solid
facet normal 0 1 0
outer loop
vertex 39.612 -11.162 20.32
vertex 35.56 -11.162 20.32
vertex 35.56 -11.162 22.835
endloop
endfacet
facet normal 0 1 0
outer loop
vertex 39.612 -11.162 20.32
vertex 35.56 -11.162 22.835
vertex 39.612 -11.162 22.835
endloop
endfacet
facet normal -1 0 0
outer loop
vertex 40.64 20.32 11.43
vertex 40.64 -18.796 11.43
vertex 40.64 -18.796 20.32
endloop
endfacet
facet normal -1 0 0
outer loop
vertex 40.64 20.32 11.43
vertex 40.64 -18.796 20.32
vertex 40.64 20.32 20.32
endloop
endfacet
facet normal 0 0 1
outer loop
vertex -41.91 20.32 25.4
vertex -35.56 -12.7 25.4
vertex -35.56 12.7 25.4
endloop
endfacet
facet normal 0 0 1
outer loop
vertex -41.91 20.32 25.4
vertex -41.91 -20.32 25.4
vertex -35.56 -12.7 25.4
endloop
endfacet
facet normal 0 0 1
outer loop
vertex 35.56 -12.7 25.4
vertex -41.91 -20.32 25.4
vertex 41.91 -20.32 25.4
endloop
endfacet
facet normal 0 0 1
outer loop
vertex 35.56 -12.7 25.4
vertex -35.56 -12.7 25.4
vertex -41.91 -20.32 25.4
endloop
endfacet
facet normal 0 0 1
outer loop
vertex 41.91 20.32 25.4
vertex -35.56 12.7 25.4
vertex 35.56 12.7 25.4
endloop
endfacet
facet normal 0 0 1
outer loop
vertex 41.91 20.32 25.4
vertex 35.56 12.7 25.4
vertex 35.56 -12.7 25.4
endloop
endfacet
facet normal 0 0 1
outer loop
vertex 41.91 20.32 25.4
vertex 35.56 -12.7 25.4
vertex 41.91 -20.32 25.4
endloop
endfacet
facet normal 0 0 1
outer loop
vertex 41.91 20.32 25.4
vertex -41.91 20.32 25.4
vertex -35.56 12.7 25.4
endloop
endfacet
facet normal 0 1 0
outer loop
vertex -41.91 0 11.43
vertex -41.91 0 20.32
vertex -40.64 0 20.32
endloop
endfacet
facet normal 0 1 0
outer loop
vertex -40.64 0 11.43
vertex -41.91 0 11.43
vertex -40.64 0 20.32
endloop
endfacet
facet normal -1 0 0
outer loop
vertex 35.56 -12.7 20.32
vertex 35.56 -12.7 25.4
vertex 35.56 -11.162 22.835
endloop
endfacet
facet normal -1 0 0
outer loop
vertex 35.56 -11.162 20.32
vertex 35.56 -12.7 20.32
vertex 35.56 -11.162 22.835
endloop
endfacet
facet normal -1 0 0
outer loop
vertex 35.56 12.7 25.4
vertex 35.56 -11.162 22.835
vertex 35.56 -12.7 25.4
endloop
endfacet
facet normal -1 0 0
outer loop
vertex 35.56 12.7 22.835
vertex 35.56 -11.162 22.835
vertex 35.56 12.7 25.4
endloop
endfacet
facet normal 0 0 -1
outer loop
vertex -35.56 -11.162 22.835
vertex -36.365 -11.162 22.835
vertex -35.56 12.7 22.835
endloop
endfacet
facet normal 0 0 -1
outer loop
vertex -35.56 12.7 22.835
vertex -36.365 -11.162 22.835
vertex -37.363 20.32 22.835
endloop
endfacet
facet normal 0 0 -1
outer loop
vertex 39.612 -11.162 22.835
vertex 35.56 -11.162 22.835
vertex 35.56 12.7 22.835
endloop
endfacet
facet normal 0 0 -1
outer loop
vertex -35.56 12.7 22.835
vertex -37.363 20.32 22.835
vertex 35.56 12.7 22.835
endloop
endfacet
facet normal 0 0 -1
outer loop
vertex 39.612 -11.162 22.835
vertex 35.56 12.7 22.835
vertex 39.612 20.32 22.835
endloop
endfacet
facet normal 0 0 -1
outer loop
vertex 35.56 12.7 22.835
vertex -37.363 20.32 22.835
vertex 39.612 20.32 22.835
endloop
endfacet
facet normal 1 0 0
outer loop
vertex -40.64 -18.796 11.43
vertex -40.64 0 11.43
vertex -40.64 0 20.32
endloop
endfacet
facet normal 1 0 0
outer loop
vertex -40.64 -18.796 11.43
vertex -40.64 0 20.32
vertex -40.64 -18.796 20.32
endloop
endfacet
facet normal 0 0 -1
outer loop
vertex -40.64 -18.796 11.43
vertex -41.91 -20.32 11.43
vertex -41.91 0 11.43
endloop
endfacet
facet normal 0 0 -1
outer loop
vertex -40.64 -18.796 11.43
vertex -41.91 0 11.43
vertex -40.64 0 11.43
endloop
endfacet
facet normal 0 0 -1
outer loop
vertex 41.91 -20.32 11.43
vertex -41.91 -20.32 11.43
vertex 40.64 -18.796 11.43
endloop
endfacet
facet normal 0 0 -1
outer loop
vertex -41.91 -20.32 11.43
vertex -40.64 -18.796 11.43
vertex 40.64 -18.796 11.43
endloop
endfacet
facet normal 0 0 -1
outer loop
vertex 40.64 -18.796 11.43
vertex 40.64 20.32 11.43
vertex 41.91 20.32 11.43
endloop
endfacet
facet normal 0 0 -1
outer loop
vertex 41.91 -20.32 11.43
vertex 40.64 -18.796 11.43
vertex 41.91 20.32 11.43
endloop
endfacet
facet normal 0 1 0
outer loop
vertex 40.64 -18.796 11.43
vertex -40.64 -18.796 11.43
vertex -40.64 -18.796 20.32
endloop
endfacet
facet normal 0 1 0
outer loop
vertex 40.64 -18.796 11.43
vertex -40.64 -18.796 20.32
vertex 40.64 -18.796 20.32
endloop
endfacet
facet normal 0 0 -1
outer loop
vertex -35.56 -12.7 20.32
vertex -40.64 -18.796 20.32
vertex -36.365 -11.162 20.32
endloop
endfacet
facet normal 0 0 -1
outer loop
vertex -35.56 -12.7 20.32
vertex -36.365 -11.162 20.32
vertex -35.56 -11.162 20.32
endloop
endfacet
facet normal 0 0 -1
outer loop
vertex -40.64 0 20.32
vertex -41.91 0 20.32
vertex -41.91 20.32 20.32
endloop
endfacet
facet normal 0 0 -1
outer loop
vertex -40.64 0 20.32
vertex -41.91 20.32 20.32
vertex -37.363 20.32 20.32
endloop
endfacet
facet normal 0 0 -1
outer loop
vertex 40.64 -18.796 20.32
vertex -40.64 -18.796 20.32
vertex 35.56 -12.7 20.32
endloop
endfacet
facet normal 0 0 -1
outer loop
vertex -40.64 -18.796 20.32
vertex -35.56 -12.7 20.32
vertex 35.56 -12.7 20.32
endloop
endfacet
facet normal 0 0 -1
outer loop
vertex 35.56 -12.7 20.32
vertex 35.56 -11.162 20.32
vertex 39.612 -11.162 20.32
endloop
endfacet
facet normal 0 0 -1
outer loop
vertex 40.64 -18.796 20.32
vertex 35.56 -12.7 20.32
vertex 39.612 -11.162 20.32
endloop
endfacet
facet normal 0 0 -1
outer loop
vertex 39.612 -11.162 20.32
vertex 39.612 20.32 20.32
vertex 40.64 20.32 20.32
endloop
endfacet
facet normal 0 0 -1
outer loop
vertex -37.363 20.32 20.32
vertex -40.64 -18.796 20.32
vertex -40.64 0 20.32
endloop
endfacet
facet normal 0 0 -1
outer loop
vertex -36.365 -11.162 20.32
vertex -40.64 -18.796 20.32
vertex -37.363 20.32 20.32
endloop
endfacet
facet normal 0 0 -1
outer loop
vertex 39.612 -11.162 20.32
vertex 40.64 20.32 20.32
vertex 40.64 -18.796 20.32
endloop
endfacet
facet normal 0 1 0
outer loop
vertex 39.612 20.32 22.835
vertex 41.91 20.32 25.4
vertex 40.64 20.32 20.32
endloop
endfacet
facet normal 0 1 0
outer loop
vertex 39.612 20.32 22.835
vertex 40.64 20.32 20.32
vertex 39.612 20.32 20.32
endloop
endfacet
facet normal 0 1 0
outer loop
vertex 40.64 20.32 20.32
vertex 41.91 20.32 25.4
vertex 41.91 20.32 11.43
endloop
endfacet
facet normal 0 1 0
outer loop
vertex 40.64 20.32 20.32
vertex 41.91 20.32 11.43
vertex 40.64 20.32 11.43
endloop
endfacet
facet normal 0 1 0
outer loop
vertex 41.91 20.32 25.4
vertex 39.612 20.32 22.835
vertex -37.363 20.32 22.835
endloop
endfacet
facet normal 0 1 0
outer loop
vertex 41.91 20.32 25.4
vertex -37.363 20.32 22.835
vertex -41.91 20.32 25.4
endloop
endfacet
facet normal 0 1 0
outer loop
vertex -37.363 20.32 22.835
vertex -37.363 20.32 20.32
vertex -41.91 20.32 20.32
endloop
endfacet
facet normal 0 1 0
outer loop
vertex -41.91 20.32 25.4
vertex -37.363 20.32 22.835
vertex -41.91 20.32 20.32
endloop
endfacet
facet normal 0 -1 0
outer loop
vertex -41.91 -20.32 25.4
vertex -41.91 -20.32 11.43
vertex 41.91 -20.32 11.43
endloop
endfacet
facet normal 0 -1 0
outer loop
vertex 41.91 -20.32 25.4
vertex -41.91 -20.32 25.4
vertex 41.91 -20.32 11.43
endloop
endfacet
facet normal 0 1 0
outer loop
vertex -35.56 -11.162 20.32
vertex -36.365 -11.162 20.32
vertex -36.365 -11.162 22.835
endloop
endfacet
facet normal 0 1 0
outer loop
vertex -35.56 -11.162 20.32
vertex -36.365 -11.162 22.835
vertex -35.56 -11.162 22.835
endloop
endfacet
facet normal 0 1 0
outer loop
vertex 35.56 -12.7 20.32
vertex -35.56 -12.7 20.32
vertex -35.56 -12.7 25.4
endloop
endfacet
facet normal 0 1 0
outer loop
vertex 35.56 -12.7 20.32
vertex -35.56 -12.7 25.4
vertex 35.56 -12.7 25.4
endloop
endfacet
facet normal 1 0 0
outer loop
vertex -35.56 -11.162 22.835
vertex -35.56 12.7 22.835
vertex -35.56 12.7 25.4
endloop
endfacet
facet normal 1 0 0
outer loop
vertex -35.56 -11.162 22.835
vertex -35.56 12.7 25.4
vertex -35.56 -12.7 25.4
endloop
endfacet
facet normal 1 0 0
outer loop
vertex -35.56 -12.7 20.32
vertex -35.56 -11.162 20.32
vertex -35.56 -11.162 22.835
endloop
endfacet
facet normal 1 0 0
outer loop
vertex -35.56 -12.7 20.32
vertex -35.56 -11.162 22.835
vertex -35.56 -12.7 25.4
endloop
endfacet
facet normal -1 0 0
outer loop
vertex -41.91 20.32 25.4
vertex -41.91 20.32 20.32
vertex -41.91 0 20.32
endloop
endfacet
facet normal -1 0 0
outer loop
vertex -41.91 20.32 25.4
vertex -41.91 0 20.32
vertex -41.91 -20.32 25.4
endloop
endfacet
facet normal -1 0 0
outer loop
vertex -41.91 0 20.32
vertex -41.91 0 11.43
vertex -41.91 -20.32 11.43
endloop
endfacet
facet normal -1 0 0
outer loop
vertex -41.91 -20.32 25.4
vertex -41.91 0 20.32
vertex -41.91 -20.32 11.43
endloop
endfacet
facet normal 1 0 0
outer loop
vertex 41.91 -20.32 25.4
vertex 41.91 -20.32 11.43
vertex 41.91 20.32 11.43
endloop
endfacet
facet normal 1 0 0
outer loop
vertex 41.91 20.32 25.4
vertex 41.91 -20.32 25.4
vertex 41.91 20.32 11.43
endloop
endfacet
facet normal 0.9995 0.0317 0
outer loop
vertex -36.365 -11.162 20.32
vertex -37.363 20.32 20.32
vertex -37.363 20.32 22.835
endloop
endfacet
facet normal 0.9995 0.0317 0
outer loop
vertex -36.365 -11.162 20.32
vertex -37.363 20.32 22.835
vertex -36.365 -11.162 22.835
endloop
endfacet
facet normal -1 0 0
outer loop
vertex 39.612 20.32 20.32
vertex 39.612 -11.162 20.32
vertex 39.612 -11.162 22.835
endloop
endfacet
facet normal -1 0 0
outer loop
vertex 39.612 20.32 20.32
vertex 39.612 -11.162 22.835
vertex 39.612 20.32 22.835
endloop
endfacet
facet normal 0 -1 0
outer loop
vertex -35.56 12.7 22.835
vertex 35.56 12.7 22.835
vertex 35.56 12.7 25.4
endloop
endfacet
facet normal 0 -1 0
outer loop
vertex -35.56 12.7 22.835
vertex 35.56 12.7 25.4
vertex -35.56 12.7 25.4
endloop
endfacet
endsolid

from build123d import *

# Parameters (mm, degrees)
F2_DEPTH  = 25.4
F3_DEPTH  = 25.4
F5_DEPTH  = 20.32
F7_DEPTH  = 22.8346
F8_W      = 44.694509
F8_H      = 15.718196
F9_DEPTH  = 17.6276
F11_DEPTH = 11.43


with BuildPart() as f2:
    # F1 (on Top) → F2 (new body)
    with BuildSketch(Plane.XY):
        Polygon((-41.91, 20.32), (-41.91, 0), (-41.91, -20.32), (41.91, -20.32), (41.91, 20.32), align=None)
    extrude(amount=F2_DEPTH)

    # F0 (on Top) → F3 (cut)
    with BuildSketch(Plane.XY):
        Polygon((-35.56, 12.7), (-35.56, 0), (-35.56, -12.7), (35.56, -12.7), (35.56, 12.7), align=None)
    extrude(amount=F3_DEPTH, mode=Mode.SUBTRACT)

    # F4 (on Top) → F5 (cut)
    with BuildSketch(Plane.XY):
        Polygon((-44.768266, 0), (-40.64, 0), (-40.64, -18.796), (40.64, -18.796), (40.64, 18.796), (40.64, 29.692128), (-40.64, 29.692128), (-44.768266, 29.847285), align=None)
    extrude(amount=F5_DEPTH, mode=Mode.SUBTRACT)

    # F6 (on Top) → F7 (cut)
    with BuildSketch(Plane.XY):
        Polygon((39.612409, -11.161779), (39.612409, 0), (39.612409, 11.161779), (39.612409, 23.861779), (35.112143, 23.861779), (35.112143, 11.161779), (35.112143, 0), (35.112143, -11.161779), align=None)
        Polygon((-36.364518, -11.161779), (35.112143, -11.161779), (35.112143, 0), (35.112143, 11.161779), (35.112143, 23.861779), (-37.475668, 23.861779), align=None)
    extrude(amount=F7_DEPTH, mode=Mode.SUBTRACT)

    # F8 (on Top) → F9 (cut)
    with BuildSketch(Plane.XY):
        with Locations((-22.347254, 7.859098)):
            Rectangle(F8_W, F8_H)
    extrude(amount=F9_DEPTH, mode=Mode.SUBTRACT)

    # F10 (on Top) → F11 (cut)
    with BuildSketch(Plane.XY):
        Polygon((-63.650727, 47.761548), (-64.214841, 0), (-64.214841, -44.940986), (66.283256, -44.940986), (66.283256, 49.265854), align=None)
    extrude(amount=F11_DEPTH, mode=Mode.SUBTRACT)


solid = f2.part
